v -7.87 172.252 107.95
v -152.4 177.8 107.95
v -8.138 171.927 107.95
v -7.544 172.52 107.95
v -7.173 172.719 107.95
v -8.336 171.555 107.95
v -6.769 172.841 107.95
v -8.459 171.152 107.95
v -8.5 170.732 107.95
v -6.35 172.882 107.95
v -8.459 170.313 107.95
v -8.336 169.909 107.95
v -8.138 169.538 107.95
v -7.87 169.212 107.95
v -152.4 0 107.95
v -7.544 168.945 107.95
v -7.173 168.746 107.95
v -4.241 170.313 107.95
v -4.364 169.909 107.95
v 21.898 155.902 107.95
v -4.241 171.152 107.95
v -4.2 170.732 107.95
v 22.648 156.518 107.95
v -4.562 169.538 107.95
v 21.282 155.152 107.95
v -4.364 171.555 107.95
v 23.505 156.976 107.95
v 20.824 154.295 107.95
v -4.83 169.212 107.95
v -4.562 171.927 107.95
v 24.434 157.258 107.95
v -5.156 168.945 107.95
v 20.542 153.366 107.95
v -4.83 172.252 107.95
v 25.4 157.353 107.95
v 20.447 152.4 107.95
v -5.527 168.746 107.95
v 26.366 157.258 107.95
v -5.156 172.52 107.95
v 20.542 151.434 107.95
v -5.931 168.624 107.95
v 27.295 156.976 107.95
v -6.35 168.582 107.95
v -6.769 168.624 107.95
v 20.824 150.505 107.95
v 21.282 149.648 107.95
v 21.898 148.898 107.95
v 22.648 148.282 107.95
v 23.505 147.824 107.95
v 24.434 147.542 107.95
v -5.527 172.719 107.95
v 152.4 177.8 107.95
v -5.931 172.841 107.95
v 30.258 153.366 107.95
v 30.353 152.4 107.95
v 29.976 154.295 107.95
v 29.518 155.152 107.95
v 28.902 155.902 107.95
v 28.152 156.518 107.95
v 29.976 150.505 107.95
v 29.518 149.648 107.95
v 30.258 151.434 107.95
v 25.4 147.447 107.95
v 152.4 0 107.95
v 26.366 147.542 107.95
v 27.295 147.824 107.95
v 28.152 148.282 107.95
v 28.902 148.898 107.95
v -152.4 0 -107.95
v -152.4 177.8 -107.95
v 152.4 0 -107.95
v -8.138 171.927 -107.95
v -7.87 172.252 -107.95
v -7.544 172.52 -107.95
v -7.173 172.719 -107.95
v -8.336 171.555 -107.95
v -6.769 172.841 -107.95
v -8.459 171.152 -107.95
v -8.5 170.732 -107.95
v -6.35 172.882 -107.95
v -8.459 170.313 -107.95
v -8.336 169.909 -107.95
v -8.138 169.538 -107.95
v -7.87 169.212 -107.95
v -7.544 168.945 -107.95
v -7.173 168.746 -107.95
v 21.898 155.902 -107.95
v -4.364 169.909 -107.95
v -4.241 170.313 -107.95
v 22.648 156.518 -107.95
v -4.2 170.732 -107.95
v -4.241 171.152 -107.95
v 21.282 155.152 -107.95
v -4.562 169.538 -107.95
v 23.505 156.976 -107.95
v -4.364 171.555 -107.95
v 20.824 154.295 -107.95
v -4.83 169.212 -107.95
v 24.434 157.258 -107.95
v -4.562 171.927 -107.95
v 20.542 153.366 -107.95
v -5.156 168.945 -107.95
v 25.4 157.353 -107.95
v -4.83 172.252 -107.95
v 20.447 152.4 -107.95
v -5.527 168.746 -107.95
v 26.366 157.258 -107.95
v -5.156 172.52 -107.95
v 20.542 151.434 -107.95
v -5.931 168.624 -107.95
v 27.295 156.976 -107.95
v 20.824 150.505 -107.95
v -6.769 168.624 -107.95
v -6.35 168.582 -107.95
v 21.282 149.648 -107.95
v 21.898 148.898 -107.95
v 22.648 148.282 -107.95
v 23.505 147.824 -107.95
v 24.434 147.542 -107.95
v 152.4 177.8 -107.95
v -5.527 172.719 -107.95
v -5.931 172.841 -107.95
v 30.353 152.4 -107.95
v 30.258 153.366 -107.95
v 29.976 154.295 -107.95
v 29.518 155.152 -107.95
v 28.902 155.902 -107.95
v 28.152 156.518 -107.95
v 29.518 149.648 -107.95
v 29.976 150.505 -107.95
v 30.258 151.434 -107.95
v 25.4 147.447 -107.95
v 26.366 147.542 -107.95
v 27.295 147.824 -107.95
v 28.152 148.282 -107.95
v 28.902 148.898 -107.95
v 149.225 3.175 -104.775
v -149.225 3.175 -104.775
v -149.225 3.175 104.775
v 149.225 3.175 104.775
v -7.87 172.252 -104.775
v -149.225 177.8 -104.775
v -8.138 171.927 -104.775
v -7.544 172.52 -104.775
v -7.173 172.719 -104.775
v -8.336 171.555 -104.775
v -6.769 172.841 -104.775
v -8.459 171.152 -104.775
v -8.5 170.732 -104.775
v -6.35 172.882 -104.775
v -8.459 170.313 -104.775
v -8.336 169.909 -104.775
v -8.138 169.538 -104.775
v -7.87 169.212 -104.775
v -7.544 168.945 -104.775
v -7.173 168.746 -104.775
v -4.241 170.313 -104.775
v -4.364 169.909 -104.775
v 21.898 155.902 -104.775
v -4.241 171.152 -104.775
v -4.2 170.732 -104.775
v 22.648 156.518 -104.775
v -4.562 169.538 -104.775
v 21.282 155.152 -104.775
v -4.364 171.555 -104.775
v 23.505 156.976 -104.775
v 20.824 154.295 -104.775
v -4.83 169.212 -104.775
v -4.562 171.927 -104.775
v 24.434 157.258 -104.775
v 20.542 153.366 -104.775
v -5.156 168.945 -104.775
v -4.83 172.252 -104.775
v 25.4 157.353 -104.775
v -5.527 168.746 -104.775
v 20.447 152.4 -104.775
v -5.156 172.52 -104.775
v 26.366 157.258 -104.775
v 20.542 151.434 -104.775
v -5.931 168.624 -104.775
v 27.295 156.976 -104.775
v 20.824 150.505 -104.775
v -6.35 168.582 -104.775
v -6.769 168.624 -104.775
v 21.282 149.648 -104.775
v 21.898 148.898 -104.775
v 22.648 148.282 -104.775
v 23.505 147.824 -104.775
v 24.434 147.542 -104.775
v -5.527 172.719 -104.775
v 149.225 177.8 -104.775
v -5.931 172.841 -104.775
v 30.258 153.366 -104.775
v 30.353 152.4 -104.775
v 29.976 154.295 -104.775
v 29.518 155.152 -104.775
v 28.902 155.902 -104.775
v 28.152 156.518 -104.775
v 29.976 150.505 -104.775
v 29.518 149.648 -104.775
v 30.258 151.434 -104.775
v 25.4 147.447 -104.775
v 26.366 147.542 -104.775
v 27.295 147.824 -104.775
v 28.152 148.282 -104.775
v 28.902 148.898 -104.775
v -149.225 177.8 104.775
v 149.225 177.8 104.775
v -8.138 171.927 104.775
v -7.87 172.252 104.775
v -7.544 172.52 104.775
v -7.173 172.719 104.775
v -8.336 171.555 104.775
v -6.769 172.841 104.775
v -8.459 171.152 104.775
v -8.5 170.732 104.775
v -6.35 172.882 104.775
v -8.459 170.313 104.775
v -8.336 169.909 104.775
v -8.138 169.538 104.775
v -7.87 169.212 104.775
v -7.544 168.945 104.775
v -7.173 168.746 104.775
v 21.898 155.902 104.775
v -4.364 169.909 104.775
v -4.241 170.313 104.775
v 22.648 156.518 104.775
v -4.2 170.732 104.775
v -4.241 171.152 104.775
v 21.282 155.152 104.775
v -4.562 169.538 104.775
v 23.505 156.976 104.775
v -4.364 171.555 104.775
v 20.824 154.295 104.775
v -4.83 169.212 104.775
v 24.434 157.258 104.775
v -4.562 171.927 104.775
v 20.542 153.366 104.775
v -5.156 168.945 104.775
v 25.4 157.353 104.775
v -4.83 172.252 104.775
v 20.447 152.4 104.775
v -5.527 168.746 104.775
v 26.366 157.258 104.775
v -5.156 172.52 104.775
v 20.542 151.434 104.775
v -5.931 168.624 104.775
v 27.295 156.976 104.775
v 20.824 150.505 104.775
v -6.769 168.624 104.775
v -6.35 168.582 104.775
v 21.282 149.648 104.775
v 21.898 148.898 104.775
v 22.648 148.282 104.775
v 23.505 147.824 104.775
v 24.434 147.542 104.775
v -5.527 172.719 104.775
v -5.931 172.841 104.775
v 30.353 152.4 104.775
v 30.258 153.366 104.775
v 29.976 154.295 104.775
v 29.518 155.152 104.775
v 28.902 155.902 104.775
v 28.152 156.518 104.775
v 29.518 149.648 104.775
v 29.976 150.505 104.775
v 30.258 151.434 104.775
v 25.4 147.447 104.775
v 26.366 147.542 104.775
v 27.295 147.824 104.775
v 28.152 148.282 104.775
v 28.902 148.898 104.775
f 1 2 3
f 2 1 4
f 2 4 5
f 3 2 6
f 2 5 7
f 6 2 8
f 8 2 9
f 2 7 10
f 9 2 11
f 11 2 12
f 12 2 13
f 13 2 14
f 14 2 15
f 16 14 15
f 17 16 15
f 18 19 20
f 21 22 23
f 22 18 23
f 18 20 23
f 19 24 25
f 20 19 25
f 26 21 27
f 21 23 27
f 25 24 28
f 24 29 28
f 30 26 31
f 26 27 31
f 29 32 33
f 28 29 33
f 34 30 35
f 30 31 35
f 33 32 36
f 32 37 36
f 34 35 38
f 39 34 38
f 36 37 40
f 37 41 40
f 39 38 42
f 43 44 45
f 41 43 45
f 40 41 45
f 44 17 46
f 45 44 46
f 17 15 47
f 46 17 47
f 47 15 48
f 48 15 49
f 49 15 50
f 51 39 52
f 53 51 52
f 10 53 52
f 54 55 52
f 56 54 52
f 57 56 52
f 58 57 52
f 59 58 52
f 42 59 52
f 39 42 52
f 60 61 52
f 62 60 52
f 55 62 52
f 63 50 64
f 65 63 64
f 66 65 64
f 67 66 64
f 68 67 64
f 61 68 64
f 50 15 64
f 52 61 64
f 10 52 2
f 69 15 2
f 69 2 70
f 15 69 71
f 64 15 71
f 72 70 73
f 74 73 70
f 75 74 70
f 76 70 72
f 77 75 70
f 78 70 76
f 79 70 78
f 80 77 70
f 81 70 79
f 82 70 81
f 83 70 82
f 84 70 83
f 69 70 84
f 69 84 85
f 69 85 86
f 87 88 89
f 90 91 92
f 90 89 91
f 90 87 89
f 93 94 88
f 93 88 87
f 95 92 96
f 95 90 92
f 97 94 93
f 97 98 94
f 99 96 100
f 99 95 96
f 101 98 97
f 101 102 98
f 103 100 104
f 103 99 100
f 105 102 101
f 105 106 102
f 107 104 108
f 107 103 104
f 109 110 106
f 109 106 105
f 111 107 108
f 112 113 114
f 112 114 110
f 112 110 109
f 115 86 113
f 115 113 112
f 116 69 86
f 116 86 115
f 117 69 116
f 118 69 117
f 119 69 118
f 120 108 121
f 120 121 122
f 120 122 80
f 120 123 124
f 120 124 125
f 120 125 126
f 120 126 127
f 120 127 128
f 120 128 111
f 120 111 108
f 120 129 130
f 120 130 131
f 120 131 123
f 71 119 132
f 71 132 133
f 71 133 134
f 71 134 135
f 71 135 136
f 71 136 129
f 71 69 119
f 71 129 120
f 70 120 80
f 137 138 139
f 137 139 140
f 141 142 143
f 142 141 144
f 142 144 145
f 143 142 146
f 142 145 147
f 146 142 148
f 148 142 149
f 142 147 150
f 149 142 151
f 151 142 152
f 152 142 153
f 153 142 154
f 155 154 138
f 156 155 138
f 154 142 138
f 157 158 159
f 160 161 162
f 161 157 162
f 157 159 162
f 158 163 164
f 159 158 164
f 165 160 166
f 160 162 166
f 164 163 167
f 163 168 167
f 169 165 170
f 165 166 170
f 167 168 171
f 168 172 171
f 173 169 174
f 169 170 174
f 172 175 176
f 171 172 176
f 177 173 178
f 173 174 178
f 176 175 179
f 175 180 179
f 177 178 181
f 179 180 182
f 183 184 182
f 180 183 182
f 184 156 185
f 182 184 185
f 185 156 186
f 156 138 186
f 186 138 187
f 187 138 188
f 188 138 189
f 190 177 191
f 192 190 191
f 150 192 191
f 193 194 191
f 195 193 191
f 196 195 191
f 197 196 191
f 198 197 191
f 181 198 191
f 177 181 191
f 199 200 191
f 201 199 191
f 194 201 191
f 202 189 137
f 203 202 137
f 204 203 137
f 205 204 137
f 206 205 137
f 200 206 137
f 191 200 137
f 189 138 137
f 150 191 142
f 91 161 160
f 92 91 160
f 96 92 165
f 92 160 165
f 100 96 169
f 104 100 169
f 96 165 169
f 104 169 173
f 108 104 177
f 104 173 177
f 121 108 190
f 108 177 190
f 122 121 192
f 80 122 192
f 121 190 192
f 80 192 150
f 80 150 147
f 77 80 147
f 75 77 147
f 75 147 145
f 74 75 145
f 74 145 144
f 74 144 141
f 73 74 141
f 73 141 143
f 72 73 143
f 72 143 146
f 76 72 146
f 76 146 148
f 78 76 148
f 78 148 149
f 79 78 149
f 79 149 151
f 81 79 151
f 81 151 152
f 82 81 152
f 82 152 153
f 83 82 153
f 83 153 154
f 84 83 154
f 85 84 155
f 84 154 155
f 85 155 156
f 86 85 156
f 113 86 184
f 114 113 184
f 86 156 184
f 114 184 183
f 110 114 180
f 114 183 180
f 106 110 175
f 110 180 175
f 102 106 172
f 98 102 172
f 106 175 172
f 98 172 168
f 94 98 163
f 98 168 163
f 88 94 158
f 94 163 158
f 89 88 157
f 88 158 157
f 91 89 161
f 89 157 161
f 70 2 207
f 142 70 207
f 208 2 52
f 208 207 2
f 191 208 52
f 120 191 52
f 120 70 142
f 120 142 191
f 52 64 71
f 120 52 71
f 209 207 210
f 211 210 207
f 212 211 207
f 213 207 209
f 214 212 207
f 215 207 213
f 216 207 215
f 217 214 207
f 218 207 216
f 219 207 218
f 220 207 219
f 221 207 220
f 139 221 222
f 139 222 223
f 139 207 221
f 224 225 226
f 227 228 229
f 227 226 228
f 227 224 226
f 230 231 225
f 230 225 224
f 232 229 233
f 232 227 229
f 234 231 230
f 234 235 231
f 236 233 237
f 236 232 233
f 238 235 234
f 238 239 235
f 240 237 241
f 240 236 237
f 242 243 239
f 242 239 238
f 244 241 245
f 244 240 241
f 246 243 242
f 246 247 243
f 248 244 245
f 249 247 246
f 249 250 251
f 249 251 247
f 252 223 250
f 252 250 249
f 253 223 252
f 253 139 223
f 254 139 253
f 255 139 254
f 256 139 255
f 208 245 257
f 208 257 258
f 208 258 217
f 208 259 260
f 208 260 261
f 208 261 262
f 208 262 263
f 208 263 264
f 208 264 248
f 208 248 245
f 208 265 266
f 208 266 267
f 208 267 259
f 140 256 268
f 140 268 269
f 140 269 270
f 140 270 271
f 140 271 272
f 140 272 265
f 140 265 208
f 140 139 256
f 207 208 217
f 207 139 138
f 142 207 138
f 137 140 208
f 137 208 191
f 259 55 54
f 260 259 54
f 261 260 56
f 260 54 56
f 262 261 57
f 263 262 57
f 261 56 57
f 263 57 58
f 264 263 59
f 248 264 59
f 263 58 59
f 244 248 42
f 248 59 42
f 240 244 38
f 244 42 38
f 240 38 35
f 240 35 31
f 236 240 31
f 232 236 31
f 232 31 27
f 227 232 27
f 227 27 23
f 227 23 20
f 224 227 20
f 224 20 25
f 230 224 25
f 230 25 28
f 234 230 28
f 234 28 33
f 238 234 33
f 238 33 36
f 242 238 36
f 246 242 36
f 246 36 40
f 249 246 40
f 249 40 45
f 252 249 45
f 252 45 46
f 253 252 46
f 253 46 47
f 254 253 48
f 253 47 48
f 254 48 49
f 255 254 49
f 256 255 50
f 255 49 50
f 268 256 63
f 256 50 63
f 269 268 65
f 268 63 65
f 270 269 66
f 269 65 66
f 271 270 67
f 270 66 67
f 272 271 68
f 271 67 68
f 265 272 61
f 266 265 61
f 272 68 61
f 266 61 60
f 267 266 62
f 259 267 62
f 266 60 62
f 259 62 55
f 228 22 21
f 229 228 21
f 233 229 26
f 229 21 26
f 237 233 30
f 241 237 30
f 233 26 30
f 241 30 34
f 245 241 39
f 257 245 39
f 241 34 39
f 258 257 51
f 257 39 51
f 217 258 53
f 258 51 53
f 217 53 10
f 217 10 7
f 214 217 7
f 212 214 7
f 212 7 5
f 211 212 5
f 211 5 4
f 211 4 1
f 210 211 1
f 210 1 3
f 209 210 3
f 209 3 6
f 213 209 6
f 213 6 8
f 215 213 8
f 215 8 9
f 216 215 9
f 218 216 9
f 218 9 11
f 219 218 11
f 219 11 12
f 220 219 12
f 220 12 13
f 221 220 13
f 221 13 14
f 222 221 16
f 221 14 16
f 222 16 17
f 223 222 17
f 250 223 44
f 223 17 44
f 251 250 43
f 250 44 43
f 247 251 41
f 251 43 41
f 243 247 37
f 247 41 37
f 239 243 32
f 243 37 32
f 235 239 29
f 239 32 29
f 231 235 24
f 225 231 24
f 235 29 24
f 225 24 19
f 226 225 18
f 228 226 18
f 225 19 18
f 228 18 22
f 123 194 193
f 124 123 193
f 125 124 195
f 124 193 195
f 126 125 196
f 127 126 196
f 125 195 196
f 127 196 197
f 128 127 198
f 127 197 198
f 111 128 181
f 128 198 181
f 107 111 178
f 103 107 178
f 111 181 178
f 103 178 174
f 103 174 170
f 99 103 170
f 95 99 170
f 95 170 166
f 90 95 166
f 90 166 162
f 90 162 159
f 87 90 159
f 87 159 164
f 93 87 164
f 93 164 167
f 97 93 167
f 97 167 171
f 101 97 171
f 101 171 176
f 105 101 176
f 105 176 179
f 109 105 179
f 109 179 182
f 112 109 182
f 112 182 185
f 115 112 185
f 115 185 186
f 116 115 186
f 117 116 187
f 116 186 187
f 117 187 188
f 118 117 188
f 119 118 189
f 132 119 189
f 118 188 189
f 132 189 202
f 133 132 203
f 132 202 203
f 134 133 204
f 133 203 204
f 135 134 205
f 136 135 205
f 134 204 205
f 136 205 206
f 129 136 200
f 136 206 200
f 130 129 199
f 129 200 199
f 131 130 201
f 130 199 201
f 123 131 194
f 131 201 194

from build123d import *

# Parameters (mm, degrees)
SKETCH1_W               = 298.45
SKETCH1_H               = 209.55
BOSS_EXTRUDE1_DEPTH     = 3.175
SKETCH1_3_W             = 304.8
SKETCH1_3_H             = 215.9
SKETCH1_3_W_2           = 298.45
SKETCH1_3_H_2           = 209.55
BOSS_EXTRUDE2_DEPTH     = 177.8
SKETCH2_R               = 4.953
SKETCH2_R_2             = 2.15
CUT_EXTRUDE1_DEPTH      = 1
CUT_EXTRUDE1_DEPTH_BACK = 216.9


with BuildPart() as part:
    # Sketch1 → Boss-Extrude1 (new body)
    with BuildSketch(Plane(origin=(0, 0, 0), x_dir=(1, 0, 0), z_dir=(0, 1, 0))):
        Rectangle(SKETCH1_W, SKETCH1_H)
    extrude(amount=BOSS_EXTRUDE1_DEPTH)

    # Sketch1<3> → Boss-Extrude2 (add)
    with BuildSketch(Plane(origin=(0, 0, 0), x_dir=(1, 0, 0), z_dir=(0, 1, 0))):
        Rectangle(SKETCH1_3_W, SKETCH1_3_H)
        Rectangle(SKETCH1_3_W_2, SKETCH1_3_H_2, mode=Mode.SUBTRACT)
    extrude(amount=BOSS_EXTRUDE2_DEPTH)

    # Sketch2 → Cut-Extrude1 (cut, two sides)
    with BuildSketch(Plane.XY.offset(107.95)) as cut_extrude1_sk:
        with Locations((25.4, 152.4)):
            Circle(SKETCH2_R)
        with Locations((-6.35, 170.7322)):
            Circle(SKETCH2_R_2)
    extrude(amount=CUT_EXTRUDE1_DEPTH, mode=Mode.SUBTRACT)
    extrude(cut_extrude1_sk.sketch, amount=-CUT_EXTRUDE1_DEPTH_BACK, mode=Mode.SUBTRACT)


solid = part.part
